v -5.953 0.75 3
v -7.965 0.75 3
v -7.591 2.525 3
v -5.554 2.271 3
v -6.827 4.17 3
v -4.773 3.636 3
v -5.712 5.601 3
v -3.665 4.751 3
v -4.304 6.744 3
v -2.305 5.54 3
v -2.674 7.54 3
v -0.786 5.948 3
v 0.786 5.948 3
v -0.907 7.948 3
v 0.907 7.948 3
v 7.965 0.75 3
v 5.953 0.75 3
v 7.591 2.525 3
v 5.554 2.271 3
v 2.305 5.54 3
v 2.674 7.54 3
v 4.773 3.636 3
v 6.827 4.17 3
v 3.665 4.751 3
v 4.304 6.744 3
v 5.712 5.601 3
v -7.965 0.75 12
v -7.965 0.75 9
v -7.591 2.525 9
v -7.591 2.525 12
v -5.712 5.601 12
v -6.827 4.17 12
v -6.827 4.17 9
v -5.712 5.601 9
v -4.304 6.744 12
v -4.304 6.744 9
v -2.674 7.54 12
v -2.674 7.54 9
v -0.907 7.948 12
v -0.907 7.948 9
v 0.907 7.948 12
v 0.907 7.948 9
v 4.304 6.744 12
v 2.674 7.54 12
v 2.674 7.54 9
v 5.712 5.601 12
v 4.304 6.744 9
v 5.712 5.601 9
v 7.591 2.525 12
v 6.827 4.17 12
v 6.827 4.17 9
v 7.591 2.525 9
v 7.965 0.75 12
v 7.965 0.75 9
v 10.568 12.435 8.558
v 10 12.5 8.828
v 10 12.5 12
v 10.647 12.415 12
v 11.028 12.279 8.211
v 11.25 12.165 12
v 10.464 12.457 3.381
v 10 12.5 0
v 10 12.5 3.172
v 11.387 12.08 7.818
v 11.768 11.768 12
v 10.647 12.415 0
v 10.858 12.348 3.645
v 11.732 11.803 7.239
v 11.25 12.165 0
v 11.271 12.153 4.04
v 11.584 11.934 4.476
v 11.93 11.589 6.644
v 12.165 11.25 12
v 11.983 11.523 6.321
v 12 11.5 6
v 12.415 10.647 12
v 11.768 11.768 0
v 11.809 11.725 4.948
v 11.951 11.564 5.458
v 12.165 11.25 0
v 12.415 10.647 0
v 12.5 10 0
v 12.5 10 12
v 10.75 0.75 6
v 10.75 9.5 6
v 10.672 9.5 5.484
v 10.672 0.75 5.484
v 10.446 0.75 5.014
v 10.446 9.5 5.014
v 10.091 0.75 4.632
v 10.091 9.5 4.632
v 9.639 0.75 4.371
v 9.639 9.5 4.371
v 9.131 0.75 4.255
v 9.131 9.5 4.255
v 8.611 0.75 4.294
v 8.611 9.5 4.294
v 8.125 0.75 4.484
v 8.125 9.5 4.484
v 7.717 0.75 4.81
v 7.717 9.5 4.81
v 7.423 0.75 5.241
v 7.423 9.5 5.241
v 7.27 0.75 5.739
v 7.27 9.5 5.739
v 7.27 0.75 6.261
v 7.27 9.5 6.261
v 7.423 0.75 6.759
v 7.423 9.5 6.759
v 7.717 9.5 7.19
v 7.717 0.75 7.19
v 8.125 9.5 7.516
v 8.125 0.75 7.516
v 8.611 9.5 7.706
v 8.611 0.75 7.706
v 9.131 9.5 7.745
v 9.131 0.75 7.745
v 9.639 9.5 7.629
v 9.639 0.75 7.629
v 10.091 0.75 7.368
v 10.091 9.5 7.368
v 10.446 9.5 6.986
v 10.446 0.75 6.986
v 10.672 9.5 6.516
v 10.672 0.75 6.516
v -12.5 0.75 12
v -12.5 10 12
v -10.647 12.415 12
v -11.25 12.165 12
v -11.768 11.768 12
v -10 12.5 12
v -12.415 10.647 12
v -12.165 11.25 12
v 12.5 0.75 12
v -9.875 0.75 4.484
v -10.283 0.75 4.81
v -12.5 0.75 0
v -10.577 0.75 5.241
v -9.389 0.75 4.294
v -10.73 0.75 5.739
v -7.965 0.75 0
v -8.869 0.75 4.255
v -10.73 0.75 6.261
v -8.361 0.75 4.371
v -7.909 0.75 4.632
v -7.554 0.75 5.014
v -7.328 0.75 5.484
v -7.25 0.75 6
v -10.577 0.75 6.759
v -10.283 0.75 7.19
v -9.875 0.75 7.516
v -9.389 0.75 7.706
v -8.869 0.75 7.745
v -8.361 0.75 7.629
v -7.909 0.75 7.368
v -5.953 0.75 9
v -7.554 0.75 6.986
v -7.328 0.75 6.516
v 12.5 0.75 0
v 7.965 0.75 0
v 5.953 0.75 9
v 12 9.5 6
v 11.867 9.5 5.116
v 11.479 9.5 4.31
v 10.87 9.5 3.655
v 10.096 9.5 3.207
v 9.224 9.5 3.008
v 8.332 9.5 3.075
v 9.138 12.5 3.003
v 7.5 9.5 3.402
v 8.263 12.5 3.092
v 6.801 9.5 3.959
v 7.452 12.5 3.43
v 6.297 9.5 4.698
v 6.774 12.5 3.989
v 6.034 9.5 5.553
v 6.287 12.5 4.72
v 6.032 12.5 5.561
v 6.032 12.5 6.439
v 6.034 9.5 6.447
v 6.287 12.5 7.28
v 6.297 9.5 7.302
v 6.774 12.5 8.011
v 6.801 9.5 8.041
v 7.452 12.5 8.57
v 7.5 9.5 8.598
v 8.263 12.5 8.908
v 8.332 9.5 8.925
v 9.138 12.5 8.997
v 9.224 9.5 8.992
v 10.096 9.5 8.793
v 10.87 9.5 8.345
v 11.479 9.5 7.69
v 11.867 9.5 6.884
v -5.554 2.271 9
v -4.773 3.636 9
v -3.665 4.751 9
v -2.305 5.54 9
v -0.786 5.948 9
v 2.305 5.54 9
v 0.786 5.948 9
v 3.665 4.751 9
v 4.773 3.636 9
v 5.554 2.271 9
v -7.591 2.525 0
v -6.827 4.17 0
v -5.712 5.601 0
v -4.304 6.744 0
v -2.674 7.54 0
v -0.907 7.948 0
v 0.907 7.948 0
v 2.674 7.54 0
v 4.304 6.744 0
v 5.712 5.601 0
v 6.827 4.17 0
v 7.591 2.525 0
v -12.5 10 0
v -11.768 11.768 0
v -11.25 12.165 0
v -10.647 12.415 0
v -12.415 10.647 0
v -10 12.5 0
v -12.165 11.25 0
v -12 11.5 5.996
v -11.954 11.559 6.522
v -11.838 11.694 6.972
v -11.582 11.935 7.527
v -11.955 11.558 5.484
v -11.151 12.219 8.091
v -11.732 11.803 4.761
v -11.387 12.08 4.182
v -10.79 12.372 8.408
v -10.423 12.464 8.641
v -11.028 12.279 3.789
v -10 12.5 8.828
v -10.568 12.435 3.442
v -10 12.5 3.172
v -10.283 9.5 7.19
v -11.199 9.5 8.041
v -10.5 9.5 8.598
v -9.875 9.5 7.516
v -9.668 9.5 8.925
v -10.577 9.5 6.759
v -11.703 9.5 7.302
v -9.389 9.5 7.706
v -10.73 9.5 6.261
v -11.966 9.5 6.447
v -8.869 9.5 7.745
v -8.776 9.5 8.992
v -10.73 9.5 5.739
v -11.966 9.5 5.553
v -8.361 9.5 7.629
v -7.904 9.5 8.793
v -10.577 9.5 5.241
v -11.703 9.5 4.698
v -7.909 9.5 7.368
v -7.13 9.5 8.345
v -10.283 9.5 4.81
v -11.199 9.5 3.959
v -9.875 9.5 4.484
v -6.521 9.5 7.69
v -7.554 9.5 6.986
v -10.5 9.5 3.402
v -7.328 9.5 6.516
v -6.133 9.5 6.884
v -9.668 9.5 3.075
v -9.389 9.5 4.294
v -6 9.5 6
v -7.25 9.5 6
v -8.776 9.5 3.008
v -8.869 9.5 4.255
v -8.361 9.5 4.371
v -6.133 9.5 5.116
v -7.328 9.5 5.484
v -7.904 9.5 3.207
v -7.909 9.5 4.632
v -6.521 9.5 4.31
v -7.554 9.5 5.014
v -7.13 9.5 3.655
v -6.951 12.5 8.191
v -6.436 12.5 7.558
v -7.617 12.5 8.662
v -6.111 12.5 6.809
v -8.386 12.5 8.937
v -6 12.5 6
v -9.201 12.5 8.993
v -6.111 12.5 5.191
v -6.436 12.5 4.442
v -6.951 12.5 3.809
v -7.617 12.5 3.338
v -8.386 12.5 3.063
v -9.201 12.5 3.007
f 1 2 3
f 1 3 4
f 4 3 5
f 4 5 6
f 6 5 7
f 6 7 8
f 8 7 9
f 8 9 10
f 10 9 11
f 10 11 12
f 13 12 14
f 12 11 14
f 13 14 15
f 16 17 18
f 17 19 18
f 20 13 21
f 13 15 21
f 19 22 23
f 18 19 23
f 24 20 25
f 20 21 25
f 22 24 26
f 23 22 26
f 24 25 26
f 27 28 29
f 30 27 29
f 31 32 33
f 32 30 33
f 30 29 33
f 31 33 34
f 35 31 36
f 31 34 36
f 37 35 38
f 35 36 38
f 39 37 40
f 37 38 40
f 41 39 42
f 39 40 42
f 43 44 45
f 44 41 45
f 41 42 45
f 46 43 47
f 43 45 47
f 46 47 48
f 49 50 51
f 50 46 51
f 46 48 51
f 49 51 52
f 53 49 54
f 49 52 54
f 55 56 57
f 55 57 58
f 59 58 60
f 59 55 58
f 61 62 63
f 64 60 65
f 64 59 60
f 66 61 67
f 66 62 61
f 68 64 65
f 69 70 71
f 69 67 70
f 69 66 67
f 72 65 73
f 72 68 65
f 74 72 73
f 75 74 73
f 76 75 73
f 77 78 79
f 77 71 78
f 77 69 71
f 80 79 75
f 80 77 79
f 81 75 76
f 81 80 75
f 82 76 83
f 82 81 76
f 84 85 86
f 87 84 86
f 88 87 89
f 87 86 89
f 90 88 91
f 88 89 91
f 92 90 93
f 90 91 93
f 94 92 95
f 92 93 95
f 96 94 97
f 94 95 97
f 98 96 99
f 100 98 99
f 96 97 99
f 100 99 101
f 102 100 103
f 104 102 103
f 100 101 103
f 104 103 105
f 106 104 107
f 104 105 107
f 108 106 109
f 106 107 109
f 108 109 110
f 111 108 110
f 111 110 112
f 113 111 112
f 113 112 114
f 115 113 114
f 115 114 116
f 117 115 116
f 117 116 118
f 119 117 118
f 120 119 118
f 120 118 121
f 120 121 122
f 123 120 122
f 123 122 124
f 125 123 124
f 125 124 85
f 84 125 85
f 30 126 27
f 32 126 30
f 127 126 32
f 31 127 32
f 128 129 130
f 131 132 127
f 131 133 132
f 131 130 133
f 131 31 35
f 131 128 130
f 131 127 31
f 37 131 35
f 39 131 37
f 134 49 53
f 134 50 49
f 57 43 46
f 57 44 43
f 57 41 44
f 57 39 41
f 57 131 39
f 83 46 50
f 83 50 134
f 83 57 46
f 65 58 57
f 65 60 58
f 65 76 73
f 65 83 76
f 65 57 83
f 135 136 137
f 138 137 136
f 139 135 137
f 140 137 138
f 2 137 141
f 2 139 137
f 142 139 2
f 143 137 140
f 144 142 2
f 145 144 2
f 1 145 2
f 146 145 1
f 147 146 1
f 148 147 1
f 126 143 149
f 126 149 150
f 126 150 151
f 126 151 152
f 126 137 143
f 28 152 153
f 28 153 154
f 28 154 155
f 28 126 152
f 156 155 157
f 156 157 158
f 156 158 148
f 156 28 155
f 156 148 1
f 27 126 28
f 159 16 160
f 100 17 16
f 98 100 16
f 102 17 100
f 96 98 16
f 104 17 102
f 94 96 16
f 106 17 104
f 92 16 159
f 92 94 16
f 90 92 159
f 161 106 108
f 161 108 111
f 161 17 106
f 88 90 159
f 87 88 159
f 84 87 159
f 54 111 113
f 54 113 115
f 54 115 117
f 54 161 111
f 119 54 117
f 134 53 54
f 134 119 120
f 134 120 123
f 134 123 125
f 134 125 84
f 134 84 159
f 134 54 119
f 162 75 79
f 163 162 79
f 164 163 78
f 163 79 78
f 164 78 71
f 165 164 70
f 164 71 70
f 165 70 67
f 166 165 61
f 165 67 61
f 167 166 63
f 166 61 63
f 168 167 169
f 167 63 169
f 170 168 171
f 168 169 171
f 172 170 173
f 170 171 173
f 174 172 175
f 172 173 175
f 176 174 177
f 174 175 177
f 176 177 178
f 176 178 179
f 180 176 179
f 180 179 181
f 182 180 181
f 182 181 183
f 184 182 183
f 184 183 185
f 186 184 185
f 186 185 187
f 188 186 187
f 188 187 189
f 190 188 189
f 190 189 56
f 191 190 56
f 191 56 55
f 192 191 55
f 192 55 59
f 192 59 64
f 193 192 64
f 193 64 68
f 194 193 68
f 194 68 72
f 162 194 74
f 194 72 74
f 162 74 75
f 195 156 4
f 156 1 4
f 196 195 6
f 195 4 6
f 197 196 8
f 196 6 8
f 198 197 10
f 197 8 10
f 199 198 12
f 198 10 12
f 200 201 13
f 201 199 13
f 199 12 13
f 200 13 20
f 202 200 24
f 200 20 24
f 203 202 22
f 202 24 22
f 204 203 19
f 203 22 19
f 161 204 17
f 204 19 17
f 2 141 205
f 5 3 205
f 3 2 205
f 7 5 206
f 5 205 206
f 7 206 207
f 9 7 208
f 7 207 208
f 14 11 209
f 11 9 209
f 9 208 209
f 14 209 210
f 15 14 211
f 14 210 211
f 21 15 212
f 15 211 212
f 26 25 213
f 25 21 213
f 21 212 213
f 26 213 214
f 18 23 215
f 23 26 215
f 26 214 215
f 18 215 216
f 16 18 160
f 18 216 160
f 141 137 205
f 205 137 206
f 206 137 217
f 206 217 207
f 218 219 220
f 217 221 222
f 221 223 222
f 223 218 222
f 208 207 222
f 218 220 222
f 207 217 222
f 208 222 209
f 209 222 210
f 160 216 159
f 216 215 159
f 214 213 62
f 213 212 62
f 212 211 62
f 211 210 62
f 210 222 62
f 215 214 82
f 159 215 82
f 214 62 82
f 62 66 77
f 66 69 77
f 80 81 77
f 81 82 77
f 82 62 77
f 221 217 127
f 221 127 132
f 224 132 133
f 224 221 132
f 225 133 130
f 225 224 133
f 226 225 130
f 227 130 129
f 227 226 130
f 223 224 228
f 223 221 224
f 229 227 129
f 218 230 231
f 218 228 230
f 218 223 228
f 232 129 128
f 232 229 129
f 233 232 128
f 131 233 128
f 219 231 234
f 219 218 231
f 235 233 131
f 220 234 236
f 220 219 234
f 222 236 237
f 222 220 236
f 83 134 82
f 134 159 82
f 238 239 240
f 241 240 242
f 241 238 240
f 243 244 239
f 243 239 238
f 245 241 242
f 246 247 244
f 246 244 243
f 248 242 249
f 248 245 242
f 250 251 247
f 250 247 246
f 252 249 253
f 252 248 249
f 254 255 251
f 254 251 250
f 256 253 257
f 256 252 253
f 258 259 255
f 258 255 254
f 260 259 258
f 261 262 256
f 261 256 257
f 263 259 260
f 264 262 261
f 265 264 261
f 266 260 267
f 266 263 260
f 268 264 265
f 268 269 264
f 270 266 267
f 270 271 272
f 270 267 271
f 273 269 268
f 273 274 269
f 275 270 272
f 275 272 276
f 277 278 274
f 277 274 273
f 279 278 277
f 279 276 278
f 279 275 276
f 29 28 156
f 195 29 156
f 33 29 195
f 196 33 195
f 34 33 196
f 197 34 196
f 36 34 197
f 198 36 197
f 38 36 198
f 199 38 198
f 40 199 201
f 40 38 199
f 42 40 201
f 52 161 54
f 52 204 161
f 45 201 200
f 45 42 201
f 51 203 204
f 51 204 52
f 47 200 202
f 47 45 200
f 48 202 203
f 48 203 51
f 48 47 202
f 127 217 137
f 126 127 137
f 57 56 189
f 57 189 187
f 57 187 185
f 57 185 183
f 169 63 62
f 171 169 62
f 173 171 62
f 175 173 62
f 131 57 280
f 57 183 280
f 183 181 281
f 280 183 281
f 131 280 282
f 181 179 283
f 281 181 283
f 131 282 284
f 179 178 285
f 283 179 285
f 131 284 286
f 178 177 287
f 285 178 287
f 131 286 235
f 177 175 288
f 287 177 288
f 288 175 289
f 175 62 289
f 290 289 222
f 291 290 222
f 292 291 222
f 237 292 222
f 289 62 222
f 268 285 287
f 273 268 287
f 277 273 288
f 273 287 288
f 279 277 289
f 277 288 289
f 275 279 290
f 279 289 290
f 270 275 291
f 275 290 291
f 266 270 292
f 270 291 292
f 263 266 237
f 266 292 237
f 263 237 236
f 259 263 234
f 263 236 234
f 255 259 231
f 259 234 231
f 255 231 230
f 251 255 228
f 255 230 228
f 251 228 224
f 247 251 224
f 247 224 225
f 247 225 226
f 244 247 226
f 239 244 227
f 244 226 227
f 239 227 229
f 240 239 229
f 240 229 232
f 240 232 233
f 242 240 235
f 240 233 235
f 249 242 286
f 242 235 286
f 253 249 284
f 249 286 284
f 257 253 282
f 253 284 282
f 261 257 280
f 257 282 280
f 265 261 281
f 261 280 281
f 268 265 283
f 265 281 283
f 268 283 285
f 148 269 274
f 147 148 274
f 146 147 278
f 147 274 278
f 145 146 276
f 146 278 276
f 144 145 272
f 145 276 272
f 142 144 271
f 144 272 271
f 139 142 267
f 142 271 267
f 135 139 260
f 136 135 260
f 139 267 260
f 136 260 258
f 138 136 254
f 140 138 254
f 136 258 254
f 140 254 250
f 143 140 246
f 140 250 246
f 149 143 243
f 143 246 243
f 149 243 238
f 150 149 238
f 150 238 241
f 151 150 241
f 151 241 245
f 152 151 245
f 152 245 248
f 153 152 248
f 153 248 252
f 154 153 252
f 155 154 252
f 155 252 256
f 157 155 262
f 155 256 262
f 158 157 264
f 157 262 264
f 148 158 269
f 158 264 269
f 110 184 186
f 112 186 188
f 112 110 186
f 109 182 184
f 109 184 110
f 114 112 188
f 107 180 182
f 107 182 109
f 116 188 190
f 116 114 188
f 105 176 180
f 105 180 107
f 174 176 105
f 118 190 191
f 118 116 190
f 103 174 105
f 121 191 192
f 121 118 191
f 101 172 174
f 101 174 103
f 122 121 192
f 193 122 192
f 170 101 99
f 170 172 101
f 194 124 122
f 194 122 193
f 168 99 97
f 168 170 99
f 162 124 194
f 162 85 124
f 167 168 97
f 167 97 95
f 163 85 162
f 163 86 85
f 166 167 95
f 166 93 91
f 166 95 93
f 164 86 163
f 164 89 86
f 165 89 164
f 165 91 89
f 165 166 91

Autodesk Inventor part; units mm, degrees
ref_plane "YZ Plane" through (0, 0, 0) normal (1, 0, 0) x (0, 1, 0)
ref_plane "XZ Plane" through (0, 0, 0) normal (0, 1, 0) x (-1, 0, 0)
ref_plane "XY Plane" through (0, 0, 0) normal (0, 0, 1) x (1, 0, 0)
sketch "Sketch1" plane through (0, 0, 0) normal (0, 0, 1) x (1, 0, 0)
  line L0 (-12.5, 12.5) -> (12.5, 12.5)
  line L1 (12.5, 12.5) -> (12.5, -12.5)
  line L2 (12.5, -12.5) -> (-12.5, -12.5)
  line L3 (-12.5, -12.5) -> (-12.5, 12.5)
  circle A0 centre (0, 0) radius 8
  point P0 (0, 12.5)
  point P1 (-12.5, 0)
  dimension "d0" = 25
  dimension "d2" = 16
extrude "Extrusion1" add sketch "Sketch1" along normal blind 3
sketch "Sketch2" plane through (0, 0, 3) normal (0, 0, 1) x (1, 0, 0)
  circle A0 centre (0, 0) radius 8 projected
  line L0 (12.5, 12.5) -> (-12.5, 12.5) projected
  line L1 (-12.5, 12.5) -> (-12.5, -12.5) projected
  line L2 (-12.5, -12.5) -> (12.5, -12.5) projected
  line L3 (12.5, -12.5) -> (12.5, 12.5) projected
  circle A1 centre (0, 0) radius 6
  dimension "d5" = 12
extrude "Extrusion2" add sketch "Sketch2" along normal blind 6 contours A0 | L3 L2 L1 L0
sketch "Sketch3" plane through (0, 0, 9) normal (0, 0, 1) x (1, 0, 0)
  line L0 (12.5, 12.5) -> (-12.5, 12.5) projected
  line L1 (-12.5, 12.5) -> (-12.5, -12.5) projected
  line L2 (-12.5, -12.5) -> (12.5, -12.5) projected
  line L3 (12.5, -12.5) -> (12.5, 12.5) projected
  circle A0 centre (0, 0) radius 8 projected
extrude "Extrusion3" add sketch "Sketch3" along normal blind 3
sketch "Sketch4" plane through (0, 0, 12) normal (0, 0, 1) x (1, 0, 0)
  circle A0 centre (0, 0) radius 8 projected
  line L0 (-12.5, 12.5) -> (-12.5, -12.5) projected
  line L1 (-12.5, 0.75) -> (12.5, 0.75)
  line L2 (12.5, 0.75) -> (12.5, -12.5)
  line L3 (12.5, -12.5) -> (-12.5, -12.5)
  line L4 (-12.5, -12.5) -> (-12.5, 0.75)
  dimension "d11" = 0.75
extrude "Extrusion4" cut sketch "Sketch4" against normal through all contours A0 L1 | A0 L1 L2 L3 L0 picked at (-1.088, -1.9346)
sketch "Sketch5" plane through (-12.5, 12.5, 0) normal (0, 1, 0) x (1, 0, 0)
  line L0 (0, 0) -> (0, -12) projected
  line L1 (25, 0) -> (25, -12) projected
  circle A0 centre (3.5, -6) radius 1.75
  circle A1 centre (21.5, -6) radius 1.75
  point P0 (12.5, 0)
  point P1 (25, -6)
  point P2 (0, -6)
  dimension "d14" = 3.5
  dimension "d16" = 3.5
  dimension "d17" = 3.5
extrude "Extrusion5" cut sketch "Sketch5" against normal through all
sketch "Sketch6" plane through (-12.5, 12.5, 0) normal (0, 1, 0) x (1, 0, 0)
  circle A0 centre (3.5, -6) radius 1.75 projected
  circle A1 centre (21.5, -6) radius 1.75 projected
  circle A2 centre (3.5, -6) radius 3
  circle A3 centre (21.5, -6) radius 3
  point P0 (12.5, 0)
  dimension "d20" = 6
  dimension "d22" = 6
extrude "Extrusion6" cut sketch "Sketch6" against normal blind 3
fillet "Fillet1" radius 2.5 2 edges at (-12.5, 12.5, 6) (12.5, 12.5, 6)
properties part number "e3d mount"
